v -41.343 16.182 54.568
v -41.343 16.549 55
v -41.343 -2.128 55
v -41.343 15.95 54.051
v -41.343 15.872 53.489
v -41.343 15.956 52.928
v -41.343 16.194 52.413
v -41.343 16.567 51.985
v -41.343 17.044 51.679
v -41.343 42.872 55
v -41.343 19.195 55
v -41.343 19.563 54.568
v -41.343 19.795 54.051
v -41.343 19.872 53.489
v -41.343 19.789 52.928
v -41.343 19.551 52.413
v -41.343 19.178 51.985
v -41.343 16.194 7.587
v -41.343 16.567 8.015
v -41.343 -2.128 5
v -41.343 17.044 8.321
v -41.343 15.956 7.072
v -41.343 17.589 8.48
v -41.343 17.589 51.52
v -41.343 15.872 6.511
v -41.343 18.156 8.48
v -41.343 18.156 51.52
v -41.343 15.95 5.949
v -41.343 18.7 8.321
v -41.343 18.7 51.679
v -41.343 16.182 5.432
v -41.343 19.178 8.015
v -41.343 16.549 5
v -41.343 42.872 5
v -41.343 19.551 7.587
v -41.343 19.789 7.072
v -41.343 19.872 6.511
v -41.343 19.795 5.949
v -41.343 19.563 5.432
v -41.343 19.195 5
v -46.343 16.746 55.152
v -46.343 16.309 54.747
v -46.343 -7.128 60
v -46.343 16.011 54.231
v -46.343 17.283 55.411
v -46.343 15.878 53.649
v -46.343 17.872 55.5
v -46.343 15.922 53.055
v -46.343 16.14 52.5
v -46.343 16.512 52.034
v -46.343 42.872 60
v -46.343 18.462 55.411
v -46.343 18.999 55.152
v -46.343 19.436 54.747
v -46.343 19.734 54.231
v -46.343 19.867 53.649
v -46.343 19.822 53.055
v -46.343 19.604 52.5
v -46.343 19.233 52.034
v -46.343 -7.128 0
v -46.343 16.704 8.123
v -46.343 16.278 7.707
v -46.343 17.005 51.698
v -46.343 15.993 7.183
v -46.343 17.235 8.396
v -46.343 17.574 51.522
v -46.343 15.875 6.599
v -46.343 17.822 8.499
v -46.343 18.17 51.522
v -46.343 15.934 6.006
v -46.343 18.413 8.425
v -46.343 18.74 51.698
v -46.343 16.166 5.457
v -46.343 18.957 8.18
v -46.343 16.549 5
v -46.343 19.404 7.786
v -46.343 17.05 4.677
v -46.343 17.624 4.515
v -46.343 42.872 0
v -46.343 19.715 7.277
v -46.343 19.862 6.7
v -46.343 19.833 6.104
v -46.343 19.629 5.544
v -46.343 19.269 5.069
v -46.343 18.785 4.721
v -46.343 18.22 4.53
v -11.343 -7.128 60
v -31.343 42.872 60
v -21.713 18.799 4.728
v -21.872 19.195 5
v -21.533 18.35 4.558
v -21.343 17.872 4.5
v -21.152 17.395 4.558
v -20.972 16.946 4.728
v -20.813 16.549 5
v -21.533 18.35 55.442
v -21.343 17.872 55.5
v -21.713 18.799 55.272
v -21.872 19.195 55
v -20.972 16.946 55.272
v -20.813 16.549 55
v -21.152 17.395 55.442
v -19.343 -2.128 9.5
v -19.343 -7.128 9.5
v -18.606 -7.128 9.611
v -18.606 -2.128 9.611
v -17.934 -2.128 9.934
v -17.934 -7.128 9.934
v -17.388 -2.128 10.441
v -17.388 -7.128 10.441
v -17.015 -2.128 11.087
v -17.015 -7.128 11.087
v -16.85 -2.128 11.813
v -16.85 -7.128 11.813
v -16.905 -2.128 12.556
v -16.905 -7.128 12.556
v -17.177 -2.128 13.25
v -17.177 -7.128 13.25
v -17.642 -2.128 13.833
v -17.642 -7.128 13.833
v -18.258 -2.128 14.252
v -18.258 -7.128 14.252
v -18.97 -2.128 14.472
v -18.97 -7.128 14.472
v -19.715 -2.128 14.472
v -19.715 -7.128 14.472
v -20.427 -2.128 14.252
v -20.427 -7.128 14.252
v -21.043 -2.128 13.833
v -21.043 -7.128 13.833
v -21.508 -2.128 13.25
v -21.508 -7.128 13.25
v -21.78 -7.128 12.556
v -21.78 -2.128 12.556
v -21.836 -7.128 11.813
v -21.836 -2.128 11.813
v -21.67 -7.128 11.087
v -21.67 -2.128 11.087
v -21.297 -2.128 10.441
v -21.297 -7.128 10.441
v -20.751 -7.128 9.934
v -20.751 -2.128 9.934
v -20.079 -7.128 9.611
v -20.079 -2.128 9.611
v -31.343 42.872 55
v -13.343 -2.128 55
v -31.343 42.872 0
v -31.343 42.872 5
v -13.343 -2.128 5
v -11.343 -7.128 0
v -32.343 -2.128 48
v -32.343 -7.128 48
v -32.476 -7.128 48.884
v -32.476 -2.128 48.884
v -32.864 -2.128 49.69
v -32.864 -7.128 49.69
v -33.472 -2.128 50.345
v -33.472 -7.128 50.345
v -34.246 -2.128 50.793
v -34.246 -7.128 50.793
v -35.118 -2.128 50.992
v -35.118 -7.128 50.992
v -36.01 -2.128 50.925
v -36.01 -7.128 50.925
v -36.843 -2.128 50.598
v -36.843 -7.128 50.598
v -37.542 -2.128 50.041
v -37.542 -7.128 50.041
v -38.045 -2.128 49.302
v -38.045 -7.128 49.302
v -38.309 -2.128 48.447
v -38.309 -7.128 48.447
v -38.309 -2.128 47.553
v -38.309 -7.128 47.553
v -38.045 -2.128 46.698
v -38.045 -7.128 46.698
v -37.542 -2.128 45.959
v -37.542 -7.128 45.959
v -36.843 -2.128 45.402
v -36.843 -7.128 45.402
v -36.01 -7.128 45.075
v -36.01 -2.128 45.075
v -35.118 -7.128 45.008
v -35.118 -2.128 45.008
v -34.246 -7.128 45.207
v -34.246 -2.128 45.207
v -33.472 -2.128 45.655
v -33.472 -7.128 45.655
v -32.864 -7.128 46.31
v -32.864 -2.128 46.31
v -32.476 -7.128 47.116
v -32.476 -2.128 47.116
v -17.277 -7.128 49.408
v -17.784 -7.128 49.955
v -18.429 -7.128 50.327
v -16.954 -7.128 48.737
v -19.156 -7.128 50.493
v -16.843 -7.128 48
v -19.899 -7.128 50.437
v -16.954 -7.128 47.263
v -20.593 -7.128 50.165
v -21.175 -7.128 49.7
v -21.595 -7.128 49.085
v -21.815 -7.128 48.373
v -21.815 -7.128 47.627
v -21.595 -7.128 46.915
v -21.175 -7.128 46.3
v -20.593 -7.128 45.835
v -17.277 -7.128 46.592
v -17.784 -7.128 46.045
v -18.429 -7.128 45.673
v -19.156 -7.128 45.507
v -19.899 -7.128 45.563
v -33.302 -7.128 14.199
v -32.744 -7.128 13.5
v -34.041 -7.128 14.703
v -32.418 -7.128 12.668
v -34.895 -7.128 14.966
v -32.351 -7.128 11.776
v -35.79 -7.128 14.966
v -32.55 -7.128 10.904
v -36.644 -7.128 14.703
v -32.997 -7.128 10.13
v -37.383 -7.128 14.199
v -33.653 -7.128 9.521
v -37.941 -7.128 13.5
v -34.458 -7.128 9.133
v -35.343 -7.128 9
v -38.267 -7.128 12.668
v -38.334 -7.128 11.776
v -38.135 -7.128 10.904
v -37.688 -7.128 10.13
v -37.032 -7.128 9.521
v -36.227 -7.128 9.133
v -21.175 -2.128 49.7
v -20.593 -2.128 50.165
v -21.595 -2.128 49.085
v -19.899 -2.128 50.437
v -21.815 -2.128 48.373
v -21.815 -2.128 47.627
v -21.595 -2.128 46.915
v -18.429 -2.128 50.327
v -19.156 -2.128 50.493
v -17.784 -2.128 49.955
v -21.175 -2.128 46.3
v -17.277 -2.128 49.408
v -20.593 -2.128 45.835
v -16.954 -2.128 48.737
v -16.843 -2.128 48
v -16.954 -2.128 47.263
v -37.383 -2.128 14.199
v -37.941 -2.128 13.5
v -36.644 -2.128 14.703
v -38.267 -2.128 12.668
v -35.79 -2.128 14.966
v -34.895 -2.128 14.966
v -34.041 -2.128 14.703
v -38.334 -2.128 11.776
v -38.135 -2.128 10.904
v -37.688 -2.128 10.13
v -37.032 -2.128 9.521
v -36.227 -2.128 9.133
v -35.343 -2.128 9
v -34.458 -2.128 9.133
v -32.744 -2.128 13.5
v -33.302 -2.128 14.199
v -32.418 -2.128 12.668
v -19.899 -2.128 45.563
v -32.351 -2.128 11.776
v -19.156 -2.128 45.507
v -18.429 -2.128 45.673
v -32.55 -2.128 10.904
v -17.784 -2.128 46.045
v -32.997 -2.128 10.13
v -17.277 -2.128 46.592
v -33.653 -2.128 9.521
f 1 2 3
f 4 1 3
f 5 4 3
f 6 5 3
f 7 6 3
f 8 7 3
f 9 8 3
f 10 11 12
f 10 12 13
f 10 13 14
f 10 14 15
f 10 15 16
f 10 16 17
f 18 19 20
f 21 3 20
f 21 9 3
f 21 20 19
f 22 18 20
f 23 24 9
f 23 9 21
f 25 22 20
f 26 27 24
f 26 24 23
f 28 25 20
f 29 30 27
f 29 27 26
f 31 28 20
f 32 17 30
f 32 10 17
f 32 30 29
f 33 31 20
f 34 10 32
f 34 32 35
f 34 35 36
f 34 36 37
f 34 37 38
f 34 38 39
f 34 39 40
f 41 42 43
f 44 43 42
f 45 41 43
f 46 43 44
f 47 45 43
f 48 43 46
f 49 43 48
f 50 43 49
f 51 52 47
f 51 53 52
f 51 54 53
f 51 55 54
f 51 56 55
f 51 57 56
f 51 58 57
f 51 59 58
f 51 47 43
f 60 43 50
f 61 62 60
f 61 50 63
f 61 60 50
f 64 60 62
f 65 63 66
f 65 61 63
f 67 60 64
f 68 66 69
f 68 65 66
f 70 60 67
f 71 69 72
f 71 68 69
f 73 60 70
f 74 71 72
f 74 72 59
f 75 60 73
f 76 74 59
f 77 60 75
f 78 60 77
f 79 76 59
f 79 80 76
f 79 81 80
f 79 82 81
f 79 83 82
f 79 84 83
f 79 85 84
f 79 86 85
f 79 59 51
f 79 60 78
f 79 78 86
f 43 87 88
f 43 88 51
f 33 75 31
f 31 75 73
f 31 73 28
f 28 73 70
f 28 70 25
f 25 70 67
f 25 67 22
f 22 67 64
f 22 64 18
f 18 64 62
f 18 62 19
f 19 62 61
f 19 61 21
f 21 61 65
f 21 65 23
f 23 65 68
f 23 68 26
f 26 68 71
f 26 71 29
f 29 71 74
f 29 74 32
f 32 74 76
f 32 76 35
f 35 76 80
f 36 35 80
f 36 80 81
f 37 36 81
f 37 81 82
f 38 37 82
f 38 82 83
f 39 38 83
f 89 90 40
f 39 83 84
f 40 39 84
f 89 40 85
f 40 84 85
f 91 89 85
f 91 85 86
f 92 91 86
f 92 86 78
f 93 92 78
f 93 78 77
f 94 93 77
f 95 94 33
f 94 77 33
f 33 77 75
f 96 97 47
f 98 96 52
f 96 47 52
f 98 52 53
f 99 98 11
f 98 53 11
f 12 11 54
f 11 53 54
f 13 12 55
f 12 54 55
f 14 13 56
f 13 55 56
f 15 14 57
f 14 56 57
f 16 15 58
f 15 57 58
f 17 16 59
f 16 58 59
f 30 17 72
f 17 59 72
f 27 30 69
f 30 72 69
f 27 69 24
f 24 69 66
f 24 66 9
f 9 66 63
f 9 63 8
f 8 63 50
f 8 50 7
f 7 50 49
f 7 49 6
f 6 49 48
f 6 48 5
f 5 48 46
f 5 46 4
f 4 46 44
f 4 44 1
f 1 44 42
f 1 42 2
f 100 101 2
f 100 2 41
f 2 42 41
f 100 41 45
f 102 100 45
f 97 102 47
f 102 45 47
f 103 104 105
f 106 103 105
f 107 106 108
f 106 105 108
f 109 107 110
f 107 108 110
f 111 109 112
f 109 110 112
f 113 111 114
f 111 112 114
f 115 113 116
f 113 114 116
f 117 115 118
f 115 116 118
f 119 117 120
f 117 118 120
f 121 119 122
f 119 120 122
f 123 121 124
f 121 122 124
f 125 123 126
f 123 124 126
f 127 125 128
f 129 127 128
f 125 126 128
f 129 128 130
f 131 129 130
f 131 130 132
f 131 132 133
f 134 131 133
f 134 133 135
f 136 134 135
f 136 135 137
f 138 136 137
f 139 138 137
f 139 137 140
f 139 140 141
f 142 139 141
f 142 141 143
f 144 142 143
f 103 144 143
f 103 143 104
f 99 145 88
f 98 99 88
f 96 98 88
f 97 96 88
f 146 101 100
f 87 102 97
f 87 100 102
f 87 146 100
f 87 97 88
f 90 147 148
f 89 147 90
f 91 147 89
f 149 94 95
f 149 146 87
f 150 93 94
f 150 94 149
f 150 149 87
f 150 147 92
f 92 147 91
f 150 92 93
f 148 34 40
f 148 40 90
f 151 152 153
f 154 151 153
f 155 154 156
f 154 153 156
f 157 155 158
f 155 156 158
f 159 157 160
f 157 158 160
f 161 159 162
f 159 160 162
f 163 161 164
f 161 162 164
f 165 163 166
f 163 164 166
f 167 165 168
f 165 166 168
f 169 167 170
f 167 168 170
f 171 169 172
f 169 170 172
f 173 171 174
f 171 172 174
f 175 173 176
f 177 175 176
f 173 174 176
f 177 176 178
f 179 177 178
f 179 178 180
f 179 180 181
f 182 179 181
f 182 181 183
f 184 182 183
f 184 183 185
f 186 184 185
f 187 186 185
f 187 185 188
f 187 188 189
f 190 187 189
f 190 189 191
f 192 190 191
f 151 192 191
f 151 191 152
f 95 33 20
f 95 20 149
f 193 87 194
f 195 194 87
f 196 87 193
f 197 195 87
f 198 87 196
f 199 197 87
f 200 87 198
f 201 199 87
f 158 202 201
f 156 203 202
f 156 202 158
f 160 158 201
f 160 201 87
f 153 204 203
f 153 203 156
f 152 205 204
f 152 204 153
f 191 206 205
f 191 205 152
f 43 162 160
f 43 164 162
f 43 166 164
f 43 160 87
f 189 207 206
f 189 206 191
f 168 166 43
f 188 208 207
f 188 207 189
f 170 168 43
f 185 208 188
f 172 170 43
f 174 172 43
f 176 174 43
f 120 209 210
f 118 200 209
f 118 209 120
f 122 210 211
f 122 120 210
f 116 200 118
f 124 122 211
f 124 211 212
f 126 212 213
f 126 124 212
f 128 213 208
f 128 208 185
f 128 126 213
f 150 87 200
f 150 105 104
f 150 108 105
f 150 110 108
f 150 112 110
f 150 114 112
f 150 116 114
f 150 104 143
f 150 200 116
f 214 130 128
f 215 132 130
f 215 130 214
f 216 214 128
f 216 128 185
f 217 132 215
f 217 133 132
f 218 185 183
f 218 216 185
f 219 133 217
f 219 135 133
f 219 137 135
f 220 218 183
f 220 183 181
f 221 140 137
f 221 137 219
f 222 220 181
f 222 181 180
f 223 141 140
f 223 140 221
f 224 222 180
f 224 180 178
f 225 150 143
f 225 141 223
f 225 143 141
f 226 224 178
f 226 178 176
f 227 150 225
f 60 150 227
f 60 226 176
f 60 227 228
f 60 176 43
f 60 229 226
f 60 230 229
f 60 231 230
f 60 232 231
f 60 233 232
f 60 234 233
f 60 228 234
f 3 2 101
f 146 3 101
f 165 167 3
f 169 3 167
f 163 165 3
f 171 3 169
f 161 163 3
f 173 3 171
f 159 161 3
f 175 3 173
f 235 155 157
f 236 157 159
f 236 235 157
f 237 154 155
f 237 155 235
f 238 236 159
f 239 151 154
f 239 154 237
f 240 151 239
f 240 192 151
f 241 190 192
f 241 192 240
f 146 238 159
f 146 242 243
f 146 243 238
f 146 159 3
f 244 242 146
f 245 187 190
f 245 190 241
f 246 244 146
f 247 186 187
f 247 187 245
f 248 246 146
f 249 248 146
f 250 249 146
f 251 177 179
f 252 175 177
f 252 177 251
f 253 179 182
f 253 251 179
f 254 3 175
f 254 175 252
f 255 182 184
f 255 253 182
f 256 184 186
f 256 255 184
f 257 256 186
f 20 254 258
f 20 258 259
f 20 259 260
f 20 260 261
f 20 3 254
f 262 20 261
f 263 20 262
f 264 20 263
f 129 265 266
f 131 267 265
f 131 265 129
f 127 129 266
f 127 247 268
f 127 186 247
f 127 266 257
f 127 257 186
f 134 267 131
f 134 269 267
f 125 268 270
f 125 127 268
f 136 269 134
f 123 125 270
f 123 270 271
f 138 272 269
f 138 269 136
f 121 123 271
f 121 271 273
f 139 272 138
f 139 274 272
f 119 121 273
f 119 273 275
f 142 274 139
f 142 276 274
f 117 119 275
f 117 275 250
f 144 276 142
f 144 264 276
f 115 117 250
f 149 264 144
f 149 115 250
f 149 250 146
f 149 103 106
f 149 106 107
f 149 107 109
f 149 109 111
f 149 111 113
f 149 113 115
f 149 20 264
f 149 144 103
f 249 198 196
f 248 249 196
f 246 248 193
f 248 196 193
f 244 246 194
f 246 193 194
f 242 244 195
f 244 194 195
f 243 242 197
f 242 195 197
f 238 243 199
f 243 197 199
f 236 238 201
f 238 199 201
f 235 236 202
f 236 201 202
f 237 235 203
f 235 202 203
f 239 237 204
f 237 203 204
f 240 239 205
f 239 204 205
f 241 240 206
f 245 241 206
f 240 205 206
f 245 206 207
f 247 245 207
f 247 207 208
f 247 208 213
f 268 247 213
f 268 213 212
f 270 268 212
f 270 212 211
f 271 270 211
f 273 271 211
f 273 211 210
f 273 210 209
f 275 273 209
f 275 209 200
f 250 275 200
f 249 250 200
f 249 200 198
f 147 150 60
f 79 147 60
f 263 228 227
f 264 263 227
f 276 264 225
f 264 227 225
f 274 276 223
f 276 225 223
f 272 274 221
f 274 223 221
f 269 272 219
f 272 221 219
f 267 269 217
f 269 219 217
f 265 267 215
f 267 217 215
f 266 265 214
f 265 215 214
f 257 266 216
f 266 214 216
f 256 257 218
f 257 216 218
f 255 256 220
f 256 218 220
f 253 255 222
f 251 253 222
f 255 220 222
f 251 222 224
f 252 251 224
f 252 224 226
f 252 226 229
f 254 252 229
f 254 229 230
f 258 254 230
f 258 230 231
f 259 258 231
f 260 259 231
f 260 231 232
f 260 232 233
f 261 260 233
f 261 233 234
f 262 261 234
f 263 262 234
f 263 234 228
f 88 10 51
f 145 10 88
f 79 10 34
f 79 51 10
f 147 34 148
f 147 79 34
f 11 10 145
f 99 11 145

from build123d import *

# Parameters (mm, degrees)
EXTRUDE_1_DEPTH     = 60
SKETCH_2_W          = 34.498052415
SKETCH_2_H          = 50
CUT_EXTRUDE_1_DEPTH = 45
SKETCH_3_R          = 3
SKETCH_3_R_2        = 2.5
CUT_EXTRUDE_2_DEPTH = 91.816454432
SKETCH_6_R          = 2
CUT_EXTRUDE_3_DEPTH = 82.627431502


with BuildPart() as part:
    # 草图1 → 凸台-拉伸1 (new body)
    with BuildSketch(Plane.XY):
        Polygon((-11.342511753, -7.127659574), (-46.342511753, -7.127659574), (-46.342511753, 42.872340426), (-31.342511753, 42.872340426), align=None)
    extrude(amount=EXTRUDE_1_DEPTH)

    # 草图2 → 切除-拉伸1 (cut)
    with BuildSketch(Plane(origin=(0, 42.872340426, 0), x_dir=(1, 0, 0), z_dir=(0, 1, 0))):
        with Locations((-24.093485546, -30)):
            Rectangle(SKETCH_2_W, SKETCH_2_H)
    extrude(amount=-CUT_EXTRUDE_1_DEPTH, mode=Mode.SUBTRACT)

    # 草图3 → 切除-拉伸2 (cut, through all)
    with BuildSketch(Plane.XZ.offset(7.127659574)):
        with Locations((-35.342511753, 48)):
            Circle(SKETCH_3_R)
        with Locations(Location((-35.342511753, 12, 0), (0, 0, 270))):
            Circle(SKETCH_3_R)
        with Locations(Location((-19.342511753, 12, 0), (0, 0, 270))):
            Circle(SKETCH_3_R_2)
        with Locations((-19.342511753, 48)):
            Circle(SKETCH_3_R_2)
    extrude(amount=-CUT_EXTRUDE_2_DEPTH, mode=Mode.SUBTRACT)

    # 草图6 → 切除-拉伸3 (cut, through all)
    with BuildSketch(Plane.ZY.offset(46.342511753)):
        with Locations((53.5, 17.872340426)):
            Circle(SKETCH_6_R)
        with Locations(Location((6.5, 17.872340426, 0), (0, 0, 221.409622109))):
            Circle(SKETCH_6_R)
    extrude(amount=-CUT_EXTRUDE_3_DEPTH, mode=Mode.SUBTRACT)


solid = part.part
